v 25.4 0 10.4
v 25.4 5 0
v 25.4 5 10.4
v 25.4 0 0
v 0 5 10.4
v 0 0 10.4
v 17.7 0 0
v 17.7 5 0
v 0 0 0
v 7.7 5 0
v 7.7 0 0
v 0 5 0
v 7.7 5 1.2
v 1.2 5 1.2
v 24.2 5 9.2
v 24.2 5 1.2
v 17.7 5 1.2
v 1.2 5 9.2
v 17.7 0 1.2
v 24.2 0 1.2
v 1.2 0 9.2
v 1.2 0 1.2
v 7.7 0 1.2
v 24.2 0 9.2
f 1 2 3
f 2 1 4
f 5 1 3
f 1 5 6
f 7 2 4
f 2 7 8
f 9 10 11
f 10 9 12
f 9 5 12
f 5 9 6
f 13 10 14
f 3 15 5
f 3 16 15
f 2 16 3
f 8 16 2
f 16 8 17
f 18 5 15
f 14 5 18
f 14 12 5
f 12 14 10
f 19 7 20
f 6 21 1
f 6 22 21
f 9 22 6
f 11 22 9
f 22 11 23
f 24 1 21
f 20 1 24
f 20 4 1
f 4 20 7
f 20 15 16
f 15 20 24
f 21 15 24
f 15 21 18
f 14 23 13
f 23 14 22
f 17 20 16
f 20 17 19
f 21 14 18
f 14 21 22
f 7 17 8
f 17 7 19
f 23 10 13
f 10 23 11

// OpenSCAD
$fn=0.2;

ih=8;
iw=23;
depth=5;
ww=1.2;
ss=10;

difference(){
    union(){
        cube([iw+ww*2,depth,ih+ww*2]);
        
        
        
    }
    
    translate([ww,-ww,ww])
    cube([iw,iw,ih]);
    
    translate([iw/2+ww-ss/2,-ww,-1])
    cube([ss,iw,ih]);
}    
